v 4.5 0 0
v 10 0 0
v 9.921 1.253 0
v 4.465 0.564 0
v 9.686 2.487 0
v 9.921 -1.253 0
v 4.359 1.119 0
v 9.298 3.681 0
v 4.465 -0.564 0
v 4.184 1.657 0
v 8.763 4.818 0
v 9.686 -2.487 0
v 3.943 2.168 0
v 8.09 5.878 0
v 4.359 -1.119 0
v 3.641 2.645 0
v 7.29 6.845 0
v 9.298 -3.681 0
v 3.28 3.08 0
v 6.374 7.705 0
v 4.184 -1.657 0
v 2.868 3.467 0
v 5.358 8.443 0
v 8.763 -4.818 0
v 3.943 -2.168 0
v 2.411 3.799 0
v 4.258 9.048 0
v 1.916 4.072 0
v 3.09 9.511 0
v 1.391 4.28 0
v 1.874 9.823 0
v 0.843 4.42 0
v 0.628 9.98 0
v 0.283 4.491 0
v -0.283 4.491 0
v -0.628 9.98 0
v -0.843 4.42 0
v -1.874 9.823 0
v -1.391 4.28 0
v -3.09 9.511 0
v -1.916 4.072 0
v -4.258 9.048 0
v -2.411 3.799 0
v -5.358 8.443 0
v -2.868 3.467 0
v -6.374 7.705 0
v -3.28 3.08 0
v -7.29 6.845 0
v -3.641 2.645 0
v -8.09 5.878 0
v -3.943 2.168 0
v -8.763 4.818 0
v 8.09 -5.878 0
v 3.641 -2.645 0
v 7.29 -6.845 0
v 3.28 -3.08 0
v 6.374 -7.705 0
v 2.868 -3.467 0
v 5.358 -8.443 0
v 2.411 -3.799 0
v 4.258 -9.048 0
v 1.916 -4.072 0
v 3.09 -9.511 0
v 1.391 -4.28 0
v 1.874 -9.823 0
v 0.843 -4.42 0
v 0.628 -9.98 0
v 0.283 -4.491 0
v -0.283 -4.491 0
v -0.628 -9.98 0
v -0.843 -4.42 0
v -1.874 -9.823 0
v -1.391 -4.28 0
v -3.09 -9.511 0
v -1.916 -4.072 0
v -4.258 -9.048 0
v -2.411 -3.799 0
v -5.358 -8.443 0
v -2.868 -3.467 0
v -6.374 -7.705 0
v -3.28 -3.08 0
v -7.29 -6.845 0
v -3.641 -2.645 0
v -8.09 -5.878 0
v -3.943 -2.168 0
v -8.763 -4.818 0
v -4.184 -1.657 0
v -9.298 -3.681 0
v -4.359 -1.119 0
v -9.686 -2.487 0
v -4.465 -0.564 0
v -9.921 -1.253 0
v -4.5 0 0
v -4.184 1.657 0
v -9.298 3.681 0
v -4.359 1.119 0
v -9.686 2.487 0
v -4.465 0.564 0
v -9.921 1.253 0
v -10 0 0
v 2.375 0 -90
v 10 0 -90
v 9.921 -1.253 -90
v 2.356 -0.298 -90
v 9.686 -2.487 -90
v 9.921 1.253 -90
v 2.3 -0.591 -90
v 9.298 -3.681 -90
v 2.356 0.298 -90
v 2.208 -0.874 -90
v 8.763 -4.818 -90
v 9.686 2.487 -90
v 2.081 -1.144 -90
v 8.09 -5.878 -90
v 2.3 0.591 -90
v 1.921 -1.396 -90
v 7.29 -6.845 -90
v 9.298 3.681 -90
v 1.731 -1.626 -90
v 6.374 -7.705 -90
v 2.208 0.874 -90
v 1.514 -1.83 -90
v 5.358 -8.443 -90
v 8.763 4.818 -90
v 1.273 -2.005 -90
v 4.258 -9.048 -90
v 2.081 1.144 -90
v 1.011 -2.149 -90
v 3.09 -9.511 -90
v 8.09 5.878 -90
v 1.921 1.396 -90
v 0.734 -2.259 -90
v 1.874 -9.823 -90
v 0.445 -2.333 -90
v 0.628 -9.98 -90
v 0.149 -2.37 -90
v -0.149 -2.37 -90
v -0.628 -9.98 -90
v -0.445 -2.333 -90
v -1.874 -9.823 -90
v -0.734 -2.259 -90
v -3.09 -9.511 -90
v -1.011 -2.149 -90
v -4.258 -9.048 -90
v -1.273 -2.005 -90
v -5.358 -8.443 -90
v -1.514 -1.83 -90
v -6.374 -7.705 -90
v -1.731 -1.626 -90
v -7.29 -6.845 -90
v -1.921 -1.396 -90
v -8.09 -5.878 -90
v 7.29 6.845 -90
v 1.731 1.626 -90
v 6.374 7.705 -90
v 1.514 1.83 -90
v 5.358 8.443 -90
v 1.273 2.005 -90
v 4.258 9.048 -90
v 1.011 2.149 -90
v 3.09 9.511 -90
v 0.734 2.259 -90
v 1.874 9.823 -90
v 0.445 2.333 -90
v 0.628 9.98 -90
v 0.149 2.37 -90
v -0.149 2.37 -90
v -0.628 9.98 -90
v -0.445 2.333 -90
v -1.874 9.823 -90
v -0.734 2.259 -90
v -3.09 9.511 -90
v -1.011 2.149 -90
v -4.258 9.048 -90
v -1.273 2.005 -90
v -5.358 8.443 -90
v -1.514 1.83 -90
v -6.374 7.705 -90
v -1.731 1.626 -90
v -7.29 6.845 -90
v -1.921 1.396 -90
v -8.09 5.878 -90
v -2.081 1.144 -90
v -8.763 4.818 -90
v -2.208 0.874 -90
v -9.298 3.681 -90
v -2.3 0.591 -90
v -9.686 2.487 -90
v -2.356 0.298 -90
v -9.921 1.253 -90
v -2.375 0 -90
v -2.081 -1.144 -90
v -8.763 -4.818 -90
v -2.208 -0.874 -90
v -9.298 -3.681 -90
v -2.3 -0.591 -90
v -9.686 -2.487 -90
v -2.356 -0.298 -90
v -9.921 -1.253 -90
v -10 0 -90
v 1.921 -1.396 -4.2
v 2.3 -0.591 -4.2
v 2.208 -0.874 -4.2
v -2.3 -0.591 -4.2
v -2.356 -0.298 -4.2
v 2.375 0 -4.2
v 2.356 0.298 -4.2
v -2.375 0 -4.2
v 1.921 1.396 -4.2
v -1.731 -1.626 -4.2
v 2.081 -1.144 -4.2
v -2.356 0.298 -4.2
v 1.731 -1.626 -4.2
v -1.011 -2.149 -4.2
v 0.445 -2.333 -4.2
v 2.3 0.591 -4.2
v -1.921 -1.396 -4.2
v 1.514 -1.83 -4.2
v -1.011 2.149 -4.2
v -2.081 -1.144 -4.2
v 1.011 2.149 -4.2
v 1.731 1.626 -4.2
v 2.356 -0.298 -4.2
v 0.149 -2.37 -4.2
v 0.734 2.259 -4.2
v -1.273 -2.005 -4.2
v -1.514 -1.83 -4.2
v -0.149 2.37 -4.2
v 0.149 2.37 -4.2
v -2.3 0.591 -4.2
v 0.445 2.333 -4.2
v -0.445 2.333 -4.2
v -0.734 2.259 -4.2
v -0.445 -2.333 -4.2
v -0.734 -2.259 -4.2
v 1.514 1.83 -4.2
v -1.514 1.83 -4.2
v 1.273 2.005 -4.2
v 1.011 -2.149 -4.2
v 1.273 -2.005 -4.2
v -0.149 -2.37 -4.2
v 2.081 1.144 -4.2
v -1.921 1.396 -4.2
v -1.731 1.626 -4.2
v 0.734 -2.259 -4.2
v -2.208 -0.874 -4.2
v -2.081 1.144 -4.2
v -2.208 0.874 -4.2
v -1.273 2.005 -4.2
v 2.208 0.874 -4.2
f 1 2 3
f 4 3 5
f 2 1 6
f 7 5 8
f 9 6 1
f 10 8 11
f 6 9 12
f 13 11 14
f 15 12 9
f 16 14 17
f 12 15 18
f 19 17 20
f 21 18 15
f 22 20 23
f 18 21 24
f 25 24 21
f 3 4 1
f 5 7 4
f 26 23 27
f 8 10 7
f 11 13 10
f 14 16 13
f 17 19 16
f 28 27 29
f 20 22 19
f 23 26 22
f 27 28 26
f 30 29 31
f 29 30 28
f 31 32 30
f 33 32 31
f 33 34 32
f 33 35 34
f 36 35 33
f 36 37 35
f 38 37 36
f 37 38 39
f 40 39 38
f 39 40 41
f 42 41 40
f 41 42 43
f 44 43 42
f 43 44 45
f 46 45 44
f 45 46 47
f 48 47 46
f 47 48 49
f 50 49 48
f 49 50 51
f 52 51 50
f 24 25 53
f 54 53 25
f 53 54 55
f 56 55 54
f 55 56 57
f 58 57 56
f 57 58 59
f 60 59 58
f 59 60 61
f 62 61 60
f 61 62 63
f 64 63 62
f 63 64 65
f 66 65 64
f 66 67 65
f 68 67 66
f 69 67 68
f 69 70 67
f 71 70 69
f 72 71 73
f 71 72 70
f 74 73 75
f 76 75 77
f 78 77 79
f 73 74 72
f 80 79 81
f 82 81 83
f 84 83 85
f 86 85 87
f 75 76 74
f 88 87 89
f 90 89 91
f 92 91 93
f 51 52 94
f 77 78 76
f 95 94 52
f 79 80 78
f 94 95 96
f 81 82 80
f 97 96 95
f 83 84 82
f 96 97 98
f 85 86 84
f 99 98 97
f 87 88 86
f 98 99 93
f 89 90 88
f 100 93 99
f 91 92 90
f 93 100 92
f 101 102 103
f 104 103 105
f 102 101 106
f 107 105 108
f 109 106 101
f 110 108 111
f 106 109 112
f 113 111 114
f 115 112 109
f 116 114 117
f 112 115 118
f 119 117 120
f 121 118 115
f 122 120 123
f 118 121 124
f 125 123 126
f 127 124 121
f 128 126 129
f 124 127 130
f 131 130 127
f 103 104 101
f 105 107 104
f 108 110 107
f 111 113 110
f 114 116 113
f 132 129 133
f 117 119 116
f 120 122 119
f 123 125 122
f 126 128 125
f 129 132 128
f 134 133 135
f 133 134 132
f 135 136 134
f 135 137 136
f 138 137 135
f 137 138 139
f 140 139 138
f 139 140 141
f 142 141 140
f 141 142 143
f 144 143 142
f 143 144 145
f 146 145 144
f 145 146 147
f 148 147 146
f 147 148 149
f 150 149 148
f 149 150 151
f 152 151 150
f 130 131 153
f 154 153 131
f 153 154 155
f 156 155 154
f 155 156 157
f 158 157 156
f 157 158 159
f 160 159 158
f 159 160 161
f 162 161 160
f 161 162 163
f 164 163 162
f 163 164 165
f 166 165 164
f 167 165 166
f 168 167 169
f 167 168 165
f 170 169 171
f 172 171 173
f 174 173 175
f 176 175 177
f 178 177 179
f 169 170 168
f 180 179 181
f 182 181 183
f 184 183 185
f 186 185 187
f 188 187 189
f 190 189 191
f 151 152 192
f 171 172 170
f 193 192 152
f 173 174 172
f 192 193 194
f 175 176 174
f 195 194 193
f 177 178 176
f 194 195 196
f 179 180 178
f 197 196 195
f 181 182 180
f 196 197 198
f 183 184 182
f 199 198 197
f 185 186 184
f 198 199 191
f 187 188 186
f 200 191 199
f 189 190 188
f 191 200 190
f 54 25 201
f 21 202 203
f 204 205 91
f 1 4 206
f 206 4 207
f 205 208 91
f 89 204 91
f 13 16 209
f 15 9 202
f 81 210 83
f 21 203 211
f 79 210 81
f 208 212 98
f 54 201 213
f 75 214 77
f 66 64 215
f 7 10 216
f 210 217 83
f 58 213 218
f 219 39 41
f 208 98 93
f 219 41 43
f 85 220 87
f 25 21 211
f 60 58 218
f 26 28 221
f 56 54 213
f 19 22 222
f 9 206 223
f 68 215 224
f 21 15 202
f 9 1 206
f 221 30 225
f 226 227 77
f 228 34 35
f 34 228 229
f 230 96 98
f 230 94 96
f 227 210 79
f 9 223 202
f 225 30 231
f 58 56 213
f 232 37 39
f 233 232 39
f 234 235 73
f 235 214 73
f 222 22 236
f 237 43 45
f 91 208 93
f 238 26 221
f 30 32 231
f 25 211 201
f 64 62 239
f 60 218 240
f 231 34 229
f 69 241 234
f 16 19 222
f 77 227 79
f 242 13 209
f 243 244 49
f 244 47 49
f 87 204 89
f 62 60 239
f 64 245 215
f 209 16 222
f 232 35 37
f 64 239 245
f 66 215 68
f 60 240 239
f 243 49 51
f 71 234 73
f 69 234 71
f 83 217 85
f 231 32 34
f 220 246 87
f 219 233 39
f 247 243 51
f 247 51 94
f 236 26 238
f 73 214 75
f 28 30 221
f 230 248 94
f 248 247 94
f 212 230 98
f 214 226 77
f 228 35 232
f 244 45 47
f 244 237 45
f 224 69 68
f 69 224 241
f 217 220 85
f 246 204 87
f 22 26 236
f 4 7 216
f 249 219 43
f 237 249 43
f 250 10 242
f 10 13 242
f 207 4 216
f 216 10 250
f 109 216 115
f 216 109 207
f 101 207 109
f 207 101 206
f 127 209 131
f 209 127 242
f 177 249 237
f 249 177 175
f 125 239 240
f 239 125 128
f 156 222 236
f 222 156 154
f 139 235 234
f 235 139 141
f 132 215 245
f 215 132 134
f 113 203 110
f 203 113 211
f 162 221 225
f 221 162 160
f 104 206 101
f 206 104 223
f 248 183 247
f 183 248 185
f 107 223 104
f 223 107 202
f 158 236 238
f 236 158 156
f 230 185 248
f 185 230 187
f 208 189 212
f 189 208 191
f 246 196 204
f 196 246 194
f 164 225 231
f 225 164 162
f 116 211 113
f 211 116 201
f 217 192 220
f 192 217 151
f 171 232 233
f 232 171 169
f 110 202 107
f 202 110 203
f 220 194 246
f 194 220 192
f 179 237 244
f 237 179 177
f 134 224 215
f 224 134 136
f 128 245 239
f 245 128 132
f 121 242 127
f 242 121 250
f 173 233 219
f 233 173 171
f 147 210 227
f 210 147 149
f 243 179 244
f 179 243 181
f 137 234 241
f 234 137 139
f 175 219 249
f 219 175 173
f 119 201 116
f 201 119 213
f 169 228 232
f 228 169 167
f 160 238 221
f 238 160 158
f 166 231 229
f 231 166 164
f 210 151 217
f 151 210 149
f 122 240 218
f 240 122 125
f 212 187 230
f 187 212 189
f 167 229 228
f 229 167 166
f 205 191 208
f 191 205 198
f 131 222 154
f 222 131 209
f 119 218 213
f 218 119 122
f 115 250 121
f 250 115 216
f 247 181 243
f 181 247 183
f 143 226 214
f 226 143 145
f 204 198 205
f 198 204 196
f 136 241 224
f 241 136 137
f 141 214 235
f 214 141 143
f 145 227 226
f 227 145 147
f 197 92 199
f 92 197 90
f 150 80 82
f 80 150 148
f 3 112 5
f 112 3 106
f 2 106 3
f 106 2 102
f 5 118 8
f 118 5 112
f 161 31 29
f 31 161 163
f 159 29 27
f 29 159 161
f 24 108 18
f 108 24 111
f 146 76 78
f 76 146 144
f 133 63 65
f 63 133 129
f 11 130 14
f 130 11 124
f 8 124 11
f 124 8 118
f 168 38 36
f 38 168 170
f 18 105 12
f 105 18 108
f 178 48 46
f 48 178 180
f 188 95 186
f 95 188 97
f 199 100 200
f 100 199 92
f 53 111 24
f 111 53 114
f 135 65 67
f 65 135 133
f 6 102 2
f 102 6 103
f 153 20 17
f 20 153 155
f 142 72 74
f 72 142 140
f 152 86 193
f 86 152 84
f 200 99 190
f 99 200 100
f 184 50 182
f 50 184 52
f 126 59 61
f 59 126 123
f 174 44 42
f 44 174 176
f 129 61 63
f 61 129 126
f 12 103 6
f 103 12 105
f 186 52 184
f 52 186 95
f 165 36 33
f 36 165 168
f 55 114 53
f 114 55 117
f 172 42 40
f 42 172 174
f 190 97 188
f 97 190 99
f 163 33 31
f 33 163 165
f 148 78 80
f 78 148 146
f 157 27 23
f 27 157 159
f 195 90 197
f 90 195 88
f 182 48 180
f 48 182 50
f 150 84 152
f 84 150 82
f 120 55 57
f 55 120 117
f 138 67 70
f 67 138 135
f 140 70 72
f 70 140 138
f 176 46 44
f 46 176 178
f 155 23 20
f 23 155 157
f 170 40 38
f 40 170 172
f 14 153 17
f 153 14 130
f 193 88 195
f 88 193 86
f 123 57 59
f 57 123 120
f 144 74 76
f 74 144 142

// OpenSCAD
$fn = 50;


difference() {
	union() {
		translate(v = [0, 0, -90.0000000000]) {
			cylinder(h = 90, r = 10.0000000000);
		}
		cylinder(h = 0, r = 13.0000000000);
	}
	union() {
		translate(v = [0, 0, 0]) {
			rotate(a = [0, 0, 0]) {
				difference() {
					union() {
						#translate(v = [0, 0, -90.0000000000]) {
							cylinder(h = 90, r = 2.2500000000);
						}
						#translate(v = [0, 0, -4.2000000000]) {
							cylinder(h = 4.2000000000, r = 10.0000000000, r1 = 2.3750000000, r2 = 4.5000000000);
						}
						#translate(v = [0, 0, -90.0000000000]) {
							cylinder(h = 90, r = 2.3750000000);
						}
						#translate(v = [0, 0, -90.0000000000]) {
							cylinder(h = 90, r = 2.2500000000);
						}
					}
					union();
				}
			}
		}
	}
}
